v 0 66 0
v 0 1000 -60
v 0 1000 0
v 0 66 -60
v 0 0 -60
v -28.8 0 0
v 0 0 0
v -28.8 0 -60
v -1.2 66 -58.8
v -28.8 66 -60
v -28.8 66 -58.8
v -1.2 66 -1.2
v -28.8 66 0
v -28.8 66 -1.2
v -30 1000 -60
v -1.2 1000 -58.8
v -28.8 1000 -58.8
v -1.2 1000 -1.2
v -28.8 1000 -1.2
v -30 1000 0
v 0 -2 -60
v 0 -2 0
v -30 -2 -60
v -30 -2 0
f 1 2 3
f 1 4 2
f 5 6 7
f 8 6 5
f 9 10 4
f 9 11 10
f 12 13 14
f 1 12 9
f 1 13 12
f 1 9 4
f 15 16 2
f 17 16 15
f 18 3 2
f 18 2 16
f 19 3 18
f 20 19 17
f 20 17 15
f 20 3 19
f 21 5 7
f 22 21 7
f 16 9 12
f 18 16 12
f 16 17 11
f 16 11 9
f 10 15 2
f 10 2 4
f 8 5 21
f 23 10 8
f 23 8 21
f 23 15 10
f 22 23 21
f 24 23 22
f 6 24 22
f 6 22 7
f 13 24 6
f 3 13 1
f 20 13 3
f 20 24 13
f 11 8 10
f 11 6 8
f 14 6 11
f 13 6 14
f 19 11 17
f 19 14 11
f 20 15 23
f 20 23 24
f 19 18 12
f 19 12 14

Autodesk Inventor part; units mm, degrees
ref_plane "YZ Plane" through (0, 0, 0) normal (1, 0, 0) x (0, 1, 0)
ref_plane "XZ Plane" through (0, 0, 0) normal (0, 1, 0) x (-1, 0, 0)
ref_plane "XY Plane" through (0, 0, 0) normal (0, 0, 1) x (1, 0, 0)
sketch "Boceto1" plane through (0, 0, 0) normal (0, 1, 0) x (-1, 0, 0)
  line L0 (0, 0) -> (30, 0)
  line L1 (30, 0) -> (30, -60)
  line L2 (30, -60) -> (0, -60)
  line L3 (0, -60) -> (0, 0)
  dimension "d0" = 60
  dimension "d1" = 30
extrude "Extrusión1" add sketch "Boceto1" along normal blind 1000
sketch "Boceto2" plane through (0, 0, 0) normal (0, -1, 0) x (1, 0, 0)
  line L0 (-1.2, -1.2) -> (-28.8, -1.2)
  line L1 (-28.8, -1.2) -> (-28.8, -58.8)
  line L2 (-28.8, -58.8) -> (-1.2, -58.8)
  line L3 (-1.2, -58.8) -> (-1.2, -1.2)
  line L4 (0, 0) -> (0, -60) projected
  line L5 (-30, -60) -> (-30, 0) projected
  line L6 (-30, 0) -> (0, 0) projected
  line L7 (0, -60) -> (-30, -60) projected
  dimension "d4" = 1.2
  dimension "d5" = 1.2
  dimension "d6" = 1.2
  dimension "d7" = 1.2
extrude "Extrusión2" cut sketch "Boceto2" against normal through all contours L3 L2 L1 L0
sketch "Boceto3" plane through (-30, 0, 0) normal (0, 0, 1) x (1, 0, 0)
  line L0 (30, 0) -> (1.2, 0)
  line L1 (1.2, 0) -> (1.2, 66)
  line L2 (1.2, 66) -> (30, 66)
  line L3 (30, 66) -> (30, 0)
  line L4 (0, 0) -> (0, 1000) projected
  dimension "d10" = 1.2
  dimension "d11" = 66
extrude "Extrusión3" cut sketch "Boceto3" against normal through all
sketch "Boceto4" plane through (-28.8, 0, 0) normal (1, 0, 0) x (0, 0, -1)
  point P0 (0, 0)
sketch "Boceto5" plane through (-30, 0, -60) normal (-1, 0, 0) x (0, 0, 1)
  line L0 (60, 0) -> (0, 0)
  line L1 (0, 0) -> (0, -2)
  line L2 (0, -2) -> (60, -2)
  line L3 (60, -2) -> (60, 0)
  dimension "d14" = 2
extrude "Extrusión4" add sketch "Boceto5" against normal blind 30
properties part number "Expendedor"
